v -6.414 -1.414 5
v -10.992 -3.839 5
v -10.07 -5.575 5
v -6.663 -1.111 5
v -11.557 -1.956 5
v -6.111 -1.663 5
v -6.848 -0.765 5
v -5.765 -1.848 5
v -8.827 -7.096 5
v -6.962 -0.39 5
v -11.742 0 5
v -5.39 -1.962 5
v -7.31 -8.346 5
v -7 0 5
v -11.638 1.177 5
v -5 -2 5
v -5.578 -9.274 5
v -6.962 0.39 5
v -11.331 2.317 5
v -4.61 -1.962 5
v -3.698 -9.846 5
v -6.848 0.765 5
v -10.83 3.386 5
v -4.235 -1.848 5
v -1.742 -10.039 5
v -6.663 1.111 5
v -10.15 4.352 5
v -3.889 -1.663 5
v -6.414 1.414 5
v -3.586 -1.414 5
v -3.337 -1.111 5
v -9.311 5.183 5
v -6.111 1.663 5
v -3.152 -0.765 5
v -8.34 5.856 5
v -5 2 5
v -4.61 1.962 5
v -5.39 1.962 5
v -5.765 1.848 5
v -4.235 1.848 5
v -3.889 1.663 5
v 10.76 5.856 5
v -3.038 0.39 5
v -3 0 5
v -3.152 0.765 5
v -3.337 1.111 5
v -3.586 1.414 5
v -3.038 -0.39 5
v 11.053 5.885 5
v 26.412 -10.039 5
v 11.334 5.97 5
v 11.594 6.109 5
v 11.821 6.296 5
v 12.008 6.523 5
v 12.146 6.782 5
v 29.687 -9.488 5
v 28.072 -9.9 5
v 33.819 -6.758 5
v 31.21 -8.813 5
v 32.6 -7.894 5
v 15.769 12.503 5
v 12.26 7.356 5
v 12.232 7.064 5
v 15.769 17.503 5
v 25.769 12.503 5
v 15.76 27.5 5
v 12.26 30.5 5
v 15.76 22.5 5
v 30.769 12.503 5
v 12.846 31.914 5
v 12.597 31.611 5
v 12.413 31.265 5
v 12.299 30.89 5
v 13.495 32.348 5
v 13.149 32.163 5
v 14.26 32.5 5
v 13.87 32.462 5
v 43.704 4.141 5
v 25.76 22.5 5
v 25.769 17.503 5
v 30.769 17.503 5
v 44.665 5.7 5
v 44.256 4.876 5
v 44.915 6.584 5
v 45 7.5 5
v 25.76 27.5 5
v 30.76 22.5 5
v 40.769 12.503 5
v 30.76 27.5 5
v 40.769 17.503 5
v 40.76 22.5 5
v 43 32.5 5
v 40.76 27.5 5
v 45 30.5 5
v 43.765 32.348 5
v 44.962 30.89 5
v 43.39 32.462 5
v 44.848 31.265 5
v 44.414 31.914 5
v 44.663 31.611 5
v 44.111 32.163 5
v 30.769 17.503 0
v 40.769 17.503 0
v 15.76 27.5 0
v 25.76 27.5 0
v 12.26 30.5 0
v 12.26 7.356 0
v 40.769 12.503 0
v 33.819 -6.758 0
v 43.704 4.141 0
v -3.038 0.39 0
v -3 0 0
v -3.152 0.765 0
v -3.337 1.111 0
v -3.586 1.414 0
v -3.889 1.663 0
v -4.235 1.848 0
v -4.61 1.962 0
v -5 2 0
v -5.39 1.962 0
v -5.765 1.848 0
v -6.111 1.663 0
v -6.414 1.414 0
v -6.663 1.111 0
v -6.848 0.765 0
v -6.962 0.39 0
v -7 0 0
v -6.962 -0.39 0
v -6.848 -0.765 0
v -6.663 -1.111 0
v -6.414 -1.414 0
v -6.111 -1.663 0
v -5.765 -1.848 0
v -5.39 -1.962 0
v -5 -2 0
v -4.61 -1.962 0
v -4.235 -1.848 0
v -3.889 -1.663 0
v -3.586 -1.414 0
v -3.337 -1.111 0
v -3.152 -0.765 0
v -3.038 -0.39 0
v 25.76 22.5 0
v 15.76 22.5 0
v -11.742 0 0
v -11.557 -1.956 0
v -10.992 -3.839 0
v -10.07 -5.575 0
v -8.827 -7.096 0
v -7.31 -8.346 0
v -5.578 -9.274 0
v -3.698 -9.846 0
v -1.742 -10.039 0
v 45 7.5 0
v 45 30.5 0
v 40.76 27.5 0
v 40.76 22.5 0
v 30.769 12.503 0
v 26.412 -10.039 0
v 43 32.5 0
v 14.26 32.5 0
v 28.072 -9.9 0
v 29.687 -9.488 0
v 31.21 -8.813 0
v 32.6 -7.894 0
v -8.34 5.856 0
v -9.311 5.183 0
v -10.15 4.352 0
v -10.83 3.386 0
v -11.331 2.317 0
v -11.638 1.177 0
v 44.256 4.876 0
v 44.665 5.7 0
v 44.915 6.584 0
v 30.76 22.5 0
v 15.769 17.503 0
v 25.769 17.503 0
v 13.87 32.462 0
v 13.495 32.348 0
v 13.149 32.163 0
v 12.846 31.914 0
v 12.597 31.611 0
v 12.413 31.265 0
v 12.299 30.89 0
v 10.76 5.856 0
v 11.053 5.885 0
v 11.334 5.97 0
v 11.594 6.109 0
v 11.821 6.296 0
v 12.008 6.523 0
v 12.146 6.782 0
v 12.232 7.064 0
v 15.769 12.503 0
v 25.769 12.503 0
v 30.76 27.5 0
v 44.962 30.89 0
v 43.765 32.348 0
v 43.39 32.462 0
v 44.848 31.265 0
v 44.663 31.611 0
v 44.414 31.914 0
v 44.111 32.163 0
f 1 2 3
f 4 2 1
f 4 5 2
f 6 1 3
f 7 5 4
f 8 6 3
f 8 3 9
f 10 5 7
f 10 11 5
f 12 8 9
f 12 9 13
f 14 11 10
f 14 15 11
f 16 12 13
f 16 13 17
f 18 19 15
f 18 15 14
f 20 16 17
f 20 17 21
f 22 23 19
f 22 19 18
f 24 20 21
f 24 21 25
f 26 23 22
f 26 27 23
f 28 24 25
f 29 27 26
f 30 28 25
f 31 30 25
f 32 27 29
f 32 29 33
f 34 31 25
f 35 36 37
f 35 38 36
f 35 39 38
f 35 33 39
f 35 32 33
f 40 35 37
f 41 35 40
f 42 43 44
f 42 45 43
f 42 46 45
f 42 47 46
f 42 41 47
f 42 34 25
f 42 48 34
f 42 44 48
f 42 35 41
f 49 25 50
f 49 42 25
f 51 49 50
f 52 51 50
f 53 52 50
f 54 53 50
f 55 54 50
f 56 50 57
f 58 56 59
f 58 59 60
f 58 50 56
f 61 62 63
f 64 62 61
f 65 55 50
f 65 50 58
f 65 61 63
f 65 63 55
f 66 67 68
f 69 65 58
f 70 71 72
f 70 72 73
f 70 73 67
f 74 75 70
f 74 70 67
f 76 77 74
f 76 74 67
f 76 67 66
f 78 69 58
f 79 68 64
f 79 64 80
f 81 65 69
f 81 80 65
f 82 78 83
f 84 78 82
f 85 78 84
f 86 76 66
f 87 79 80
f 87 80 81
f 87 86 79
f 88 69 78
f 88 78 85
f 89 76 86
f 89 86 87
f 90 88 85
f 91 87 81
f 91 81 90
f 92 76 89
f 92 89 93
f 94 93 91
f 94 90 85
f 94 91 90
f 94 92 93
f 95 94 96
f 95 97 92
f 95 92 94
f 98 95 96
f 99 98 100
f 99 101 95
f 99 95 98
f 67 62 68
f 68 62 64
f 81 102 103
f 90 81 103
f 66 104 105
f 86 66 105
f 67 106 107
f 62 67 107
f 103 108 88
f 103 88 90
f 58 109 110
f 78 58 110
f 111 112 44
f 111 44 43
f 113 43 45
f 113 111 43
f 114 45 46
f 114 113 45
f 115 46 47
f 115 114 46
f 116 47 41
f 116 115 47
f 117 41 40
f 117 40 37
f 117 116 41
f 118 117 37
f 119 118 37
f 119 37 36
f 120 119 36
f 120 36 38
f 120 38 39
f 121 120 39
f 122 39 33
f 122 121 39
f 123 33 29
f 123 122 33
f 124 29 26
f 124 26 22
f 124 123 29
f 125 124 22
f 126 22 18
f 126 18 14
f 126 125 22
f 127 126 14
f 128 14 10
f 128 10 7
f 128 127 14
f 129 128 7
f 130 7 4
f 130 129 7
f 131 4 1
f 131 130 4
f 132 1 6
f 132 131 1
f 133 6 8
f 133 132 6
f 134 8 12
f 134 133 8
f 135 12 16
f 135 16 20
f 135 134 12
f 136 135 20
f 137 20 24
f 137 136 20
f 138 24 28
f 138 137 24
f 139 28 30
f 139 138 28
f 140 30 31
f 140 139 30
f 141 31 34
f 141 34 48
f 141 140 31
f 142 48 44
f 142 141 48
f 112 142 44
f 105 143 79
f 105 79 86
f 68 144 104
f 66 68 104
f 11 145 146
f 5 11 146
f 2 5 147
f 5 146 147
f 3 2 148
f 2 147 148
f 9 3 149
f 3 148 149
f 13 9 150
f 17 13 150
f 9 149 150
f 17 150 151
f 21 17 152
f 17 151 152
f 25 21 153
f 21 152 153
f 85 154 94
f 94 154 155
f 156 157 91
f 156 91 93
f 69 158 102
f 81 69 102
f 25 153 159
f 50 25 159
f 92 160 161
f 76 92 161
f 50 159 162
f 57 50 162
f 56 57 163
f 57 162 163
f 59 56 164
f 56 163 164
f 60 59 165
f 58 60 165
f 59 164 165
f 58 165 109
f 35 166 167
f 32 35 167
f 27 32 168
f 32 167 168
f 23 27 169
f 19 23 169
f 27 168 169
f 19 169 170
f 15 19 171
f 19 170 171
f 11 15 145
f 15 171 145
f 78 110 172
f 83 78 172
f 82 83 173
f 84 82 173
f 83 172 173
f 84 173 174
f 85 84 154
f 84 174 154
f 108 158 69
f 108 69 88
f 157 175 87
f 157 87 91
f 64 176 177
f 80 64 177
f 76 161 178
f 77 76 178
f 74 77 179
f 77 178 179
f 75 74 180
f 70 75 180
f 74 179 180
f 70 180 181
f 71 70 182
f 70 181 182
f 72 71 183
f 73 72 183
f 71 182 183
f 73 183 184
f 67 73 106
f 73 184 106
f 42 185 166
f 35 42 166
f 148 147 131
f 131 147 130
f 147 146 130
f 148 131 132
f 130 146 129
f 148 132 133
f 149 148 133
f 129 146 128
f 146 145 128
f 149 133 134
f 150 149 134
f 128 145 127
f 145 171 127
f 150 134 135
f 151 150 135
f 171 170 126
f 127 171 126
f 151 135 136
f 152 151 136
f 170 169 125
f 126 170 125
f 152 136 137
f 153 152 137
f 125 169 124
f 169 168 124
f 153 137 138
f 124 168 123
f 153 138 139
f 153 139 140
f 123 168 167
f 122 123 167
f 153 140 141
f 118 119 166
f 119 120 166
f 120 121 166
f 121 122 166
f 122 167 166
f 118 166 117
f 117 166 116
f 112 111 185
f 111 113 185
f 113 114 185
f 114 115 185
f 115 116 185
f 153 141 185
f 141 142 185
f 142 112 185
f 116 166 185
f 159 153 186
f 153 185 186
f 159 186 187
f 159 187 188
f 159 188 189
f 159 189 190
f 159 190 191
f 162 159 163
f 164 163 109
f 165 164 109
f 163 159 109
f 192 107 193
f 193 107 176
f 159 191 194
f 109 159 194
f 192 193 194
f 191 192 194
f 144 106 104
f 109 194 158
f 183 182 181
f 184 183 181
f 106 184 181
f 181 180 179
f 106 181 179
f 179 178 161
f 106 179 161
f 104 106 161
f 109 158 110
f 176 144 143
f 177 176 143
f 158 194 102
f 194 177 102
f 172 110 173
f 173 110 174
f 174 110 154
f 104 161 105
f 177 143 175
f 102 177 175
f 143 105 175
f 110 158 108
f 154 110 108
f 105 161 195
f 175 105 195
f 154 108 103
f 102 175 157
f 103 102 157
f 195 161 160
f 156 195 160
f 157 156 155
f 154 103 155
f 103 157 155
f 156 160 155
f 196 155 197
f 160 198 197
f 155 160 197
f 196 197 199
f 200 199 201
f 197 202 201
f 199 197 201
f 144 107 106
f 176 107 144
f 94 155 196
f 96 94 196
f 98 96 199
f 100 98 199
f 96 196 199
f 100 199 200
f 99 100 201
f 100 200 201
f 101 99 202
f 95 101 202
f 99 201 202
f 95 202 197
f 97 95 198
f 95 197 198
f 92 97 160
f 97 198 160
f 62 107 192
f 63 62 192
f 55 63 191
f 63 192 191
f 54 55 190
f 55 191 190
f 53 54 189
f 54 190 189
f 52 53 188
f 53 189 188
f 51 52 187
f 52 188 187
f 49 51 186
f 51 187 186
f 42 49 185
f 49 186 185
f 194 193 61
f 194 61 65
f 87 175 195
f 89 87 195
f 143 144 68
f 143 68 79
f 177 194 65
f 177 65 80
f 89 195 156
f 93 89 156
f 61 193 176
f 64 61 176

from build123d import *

# Parameters (mm, degrees)
SKETCH1_R           = 2
SKETCH1_W           = 10
SKETCH1_H           = 5
BOSS_EXTRUDE1_DEPTH = 5


with BuildPart() as part:
    # Sketch1 → Boss-Extrude1 (new body)
    with BuildSketch(Plane.XY):
        with BuildLine():
            Line((-1.742019887, -10.039309555), (26.411625907, -10.039309555))
            ThreePointArc((26.411625907, -10.039309555), (30.462414048, -9.182127251), (33.818749407, -6.757532642))
            Line((33.818749407, -6.757532642), (43.703561538, 4.140888457))
            ThreePointArc((43.703561538, 4.140888457), (44.664643865, 5.699695686), (44.999999787, 7.5))
            Line((44.999999787, 7.5), (44.999999787, 30.5))
            ThreePointArc((44.999999787, 30.5), (44.41421335, 31.914213562), (42.999999787, 32.5))
            Line((42.999999787, 32.5), (14.260362516, 32.5))
            ThreePointArc((14.260362516, 32.5), (12.846148953, 31.914213562), (12.260362516, 30.5))
            Line((12.260362516, 30.5), (12.260362516, 7.356217509))
            ThreePointArc((12.260362516, 7.356217509), (11.821022687, 6.295557338), (10.760362516, 5.856217509))
            Line((10.760362516, 5.856217509), (-8.340435128, 5.856217509))
            ThreePointArc((-8.340435128, 5.856217509), (-10.829871883, 3.386204984), (-11.741942625, 0))
            ThreePointArc((-11.741942625, 0), (-8.826972094, -7.096465655), (-1.742019887, -10.039309555))
        make_face()
        with Locations((-5, 0)):
            Circle(SKETCH1_R, mode=Mode.SUBTRACT)
        with Locations((20.760362516, 25)):
            Rectangle(SKETCH1_W, SKETCH1_H, mode=Mode.SUBTRACT)
        with Locations((35.760362516, 25)):
            Rectangle(SKETCH1_W, SKETCH1_H, mode=Mode.SUBTRACT)
        with Locations((20.768559845, 15.003110344)):
            Rectangle(SKETCH1_W, SKETCH1_H, mode=Mode.SUBTRACT)
        with Locations((35.768559845, 15.003110344)):
            Rectangle(SKETCH1_W, SKETCH1_H, mode=Mode.SUBTRACT)
    extrude(amount=BOSS_EXTRUDE1_DEPTH)


solid = part.part
